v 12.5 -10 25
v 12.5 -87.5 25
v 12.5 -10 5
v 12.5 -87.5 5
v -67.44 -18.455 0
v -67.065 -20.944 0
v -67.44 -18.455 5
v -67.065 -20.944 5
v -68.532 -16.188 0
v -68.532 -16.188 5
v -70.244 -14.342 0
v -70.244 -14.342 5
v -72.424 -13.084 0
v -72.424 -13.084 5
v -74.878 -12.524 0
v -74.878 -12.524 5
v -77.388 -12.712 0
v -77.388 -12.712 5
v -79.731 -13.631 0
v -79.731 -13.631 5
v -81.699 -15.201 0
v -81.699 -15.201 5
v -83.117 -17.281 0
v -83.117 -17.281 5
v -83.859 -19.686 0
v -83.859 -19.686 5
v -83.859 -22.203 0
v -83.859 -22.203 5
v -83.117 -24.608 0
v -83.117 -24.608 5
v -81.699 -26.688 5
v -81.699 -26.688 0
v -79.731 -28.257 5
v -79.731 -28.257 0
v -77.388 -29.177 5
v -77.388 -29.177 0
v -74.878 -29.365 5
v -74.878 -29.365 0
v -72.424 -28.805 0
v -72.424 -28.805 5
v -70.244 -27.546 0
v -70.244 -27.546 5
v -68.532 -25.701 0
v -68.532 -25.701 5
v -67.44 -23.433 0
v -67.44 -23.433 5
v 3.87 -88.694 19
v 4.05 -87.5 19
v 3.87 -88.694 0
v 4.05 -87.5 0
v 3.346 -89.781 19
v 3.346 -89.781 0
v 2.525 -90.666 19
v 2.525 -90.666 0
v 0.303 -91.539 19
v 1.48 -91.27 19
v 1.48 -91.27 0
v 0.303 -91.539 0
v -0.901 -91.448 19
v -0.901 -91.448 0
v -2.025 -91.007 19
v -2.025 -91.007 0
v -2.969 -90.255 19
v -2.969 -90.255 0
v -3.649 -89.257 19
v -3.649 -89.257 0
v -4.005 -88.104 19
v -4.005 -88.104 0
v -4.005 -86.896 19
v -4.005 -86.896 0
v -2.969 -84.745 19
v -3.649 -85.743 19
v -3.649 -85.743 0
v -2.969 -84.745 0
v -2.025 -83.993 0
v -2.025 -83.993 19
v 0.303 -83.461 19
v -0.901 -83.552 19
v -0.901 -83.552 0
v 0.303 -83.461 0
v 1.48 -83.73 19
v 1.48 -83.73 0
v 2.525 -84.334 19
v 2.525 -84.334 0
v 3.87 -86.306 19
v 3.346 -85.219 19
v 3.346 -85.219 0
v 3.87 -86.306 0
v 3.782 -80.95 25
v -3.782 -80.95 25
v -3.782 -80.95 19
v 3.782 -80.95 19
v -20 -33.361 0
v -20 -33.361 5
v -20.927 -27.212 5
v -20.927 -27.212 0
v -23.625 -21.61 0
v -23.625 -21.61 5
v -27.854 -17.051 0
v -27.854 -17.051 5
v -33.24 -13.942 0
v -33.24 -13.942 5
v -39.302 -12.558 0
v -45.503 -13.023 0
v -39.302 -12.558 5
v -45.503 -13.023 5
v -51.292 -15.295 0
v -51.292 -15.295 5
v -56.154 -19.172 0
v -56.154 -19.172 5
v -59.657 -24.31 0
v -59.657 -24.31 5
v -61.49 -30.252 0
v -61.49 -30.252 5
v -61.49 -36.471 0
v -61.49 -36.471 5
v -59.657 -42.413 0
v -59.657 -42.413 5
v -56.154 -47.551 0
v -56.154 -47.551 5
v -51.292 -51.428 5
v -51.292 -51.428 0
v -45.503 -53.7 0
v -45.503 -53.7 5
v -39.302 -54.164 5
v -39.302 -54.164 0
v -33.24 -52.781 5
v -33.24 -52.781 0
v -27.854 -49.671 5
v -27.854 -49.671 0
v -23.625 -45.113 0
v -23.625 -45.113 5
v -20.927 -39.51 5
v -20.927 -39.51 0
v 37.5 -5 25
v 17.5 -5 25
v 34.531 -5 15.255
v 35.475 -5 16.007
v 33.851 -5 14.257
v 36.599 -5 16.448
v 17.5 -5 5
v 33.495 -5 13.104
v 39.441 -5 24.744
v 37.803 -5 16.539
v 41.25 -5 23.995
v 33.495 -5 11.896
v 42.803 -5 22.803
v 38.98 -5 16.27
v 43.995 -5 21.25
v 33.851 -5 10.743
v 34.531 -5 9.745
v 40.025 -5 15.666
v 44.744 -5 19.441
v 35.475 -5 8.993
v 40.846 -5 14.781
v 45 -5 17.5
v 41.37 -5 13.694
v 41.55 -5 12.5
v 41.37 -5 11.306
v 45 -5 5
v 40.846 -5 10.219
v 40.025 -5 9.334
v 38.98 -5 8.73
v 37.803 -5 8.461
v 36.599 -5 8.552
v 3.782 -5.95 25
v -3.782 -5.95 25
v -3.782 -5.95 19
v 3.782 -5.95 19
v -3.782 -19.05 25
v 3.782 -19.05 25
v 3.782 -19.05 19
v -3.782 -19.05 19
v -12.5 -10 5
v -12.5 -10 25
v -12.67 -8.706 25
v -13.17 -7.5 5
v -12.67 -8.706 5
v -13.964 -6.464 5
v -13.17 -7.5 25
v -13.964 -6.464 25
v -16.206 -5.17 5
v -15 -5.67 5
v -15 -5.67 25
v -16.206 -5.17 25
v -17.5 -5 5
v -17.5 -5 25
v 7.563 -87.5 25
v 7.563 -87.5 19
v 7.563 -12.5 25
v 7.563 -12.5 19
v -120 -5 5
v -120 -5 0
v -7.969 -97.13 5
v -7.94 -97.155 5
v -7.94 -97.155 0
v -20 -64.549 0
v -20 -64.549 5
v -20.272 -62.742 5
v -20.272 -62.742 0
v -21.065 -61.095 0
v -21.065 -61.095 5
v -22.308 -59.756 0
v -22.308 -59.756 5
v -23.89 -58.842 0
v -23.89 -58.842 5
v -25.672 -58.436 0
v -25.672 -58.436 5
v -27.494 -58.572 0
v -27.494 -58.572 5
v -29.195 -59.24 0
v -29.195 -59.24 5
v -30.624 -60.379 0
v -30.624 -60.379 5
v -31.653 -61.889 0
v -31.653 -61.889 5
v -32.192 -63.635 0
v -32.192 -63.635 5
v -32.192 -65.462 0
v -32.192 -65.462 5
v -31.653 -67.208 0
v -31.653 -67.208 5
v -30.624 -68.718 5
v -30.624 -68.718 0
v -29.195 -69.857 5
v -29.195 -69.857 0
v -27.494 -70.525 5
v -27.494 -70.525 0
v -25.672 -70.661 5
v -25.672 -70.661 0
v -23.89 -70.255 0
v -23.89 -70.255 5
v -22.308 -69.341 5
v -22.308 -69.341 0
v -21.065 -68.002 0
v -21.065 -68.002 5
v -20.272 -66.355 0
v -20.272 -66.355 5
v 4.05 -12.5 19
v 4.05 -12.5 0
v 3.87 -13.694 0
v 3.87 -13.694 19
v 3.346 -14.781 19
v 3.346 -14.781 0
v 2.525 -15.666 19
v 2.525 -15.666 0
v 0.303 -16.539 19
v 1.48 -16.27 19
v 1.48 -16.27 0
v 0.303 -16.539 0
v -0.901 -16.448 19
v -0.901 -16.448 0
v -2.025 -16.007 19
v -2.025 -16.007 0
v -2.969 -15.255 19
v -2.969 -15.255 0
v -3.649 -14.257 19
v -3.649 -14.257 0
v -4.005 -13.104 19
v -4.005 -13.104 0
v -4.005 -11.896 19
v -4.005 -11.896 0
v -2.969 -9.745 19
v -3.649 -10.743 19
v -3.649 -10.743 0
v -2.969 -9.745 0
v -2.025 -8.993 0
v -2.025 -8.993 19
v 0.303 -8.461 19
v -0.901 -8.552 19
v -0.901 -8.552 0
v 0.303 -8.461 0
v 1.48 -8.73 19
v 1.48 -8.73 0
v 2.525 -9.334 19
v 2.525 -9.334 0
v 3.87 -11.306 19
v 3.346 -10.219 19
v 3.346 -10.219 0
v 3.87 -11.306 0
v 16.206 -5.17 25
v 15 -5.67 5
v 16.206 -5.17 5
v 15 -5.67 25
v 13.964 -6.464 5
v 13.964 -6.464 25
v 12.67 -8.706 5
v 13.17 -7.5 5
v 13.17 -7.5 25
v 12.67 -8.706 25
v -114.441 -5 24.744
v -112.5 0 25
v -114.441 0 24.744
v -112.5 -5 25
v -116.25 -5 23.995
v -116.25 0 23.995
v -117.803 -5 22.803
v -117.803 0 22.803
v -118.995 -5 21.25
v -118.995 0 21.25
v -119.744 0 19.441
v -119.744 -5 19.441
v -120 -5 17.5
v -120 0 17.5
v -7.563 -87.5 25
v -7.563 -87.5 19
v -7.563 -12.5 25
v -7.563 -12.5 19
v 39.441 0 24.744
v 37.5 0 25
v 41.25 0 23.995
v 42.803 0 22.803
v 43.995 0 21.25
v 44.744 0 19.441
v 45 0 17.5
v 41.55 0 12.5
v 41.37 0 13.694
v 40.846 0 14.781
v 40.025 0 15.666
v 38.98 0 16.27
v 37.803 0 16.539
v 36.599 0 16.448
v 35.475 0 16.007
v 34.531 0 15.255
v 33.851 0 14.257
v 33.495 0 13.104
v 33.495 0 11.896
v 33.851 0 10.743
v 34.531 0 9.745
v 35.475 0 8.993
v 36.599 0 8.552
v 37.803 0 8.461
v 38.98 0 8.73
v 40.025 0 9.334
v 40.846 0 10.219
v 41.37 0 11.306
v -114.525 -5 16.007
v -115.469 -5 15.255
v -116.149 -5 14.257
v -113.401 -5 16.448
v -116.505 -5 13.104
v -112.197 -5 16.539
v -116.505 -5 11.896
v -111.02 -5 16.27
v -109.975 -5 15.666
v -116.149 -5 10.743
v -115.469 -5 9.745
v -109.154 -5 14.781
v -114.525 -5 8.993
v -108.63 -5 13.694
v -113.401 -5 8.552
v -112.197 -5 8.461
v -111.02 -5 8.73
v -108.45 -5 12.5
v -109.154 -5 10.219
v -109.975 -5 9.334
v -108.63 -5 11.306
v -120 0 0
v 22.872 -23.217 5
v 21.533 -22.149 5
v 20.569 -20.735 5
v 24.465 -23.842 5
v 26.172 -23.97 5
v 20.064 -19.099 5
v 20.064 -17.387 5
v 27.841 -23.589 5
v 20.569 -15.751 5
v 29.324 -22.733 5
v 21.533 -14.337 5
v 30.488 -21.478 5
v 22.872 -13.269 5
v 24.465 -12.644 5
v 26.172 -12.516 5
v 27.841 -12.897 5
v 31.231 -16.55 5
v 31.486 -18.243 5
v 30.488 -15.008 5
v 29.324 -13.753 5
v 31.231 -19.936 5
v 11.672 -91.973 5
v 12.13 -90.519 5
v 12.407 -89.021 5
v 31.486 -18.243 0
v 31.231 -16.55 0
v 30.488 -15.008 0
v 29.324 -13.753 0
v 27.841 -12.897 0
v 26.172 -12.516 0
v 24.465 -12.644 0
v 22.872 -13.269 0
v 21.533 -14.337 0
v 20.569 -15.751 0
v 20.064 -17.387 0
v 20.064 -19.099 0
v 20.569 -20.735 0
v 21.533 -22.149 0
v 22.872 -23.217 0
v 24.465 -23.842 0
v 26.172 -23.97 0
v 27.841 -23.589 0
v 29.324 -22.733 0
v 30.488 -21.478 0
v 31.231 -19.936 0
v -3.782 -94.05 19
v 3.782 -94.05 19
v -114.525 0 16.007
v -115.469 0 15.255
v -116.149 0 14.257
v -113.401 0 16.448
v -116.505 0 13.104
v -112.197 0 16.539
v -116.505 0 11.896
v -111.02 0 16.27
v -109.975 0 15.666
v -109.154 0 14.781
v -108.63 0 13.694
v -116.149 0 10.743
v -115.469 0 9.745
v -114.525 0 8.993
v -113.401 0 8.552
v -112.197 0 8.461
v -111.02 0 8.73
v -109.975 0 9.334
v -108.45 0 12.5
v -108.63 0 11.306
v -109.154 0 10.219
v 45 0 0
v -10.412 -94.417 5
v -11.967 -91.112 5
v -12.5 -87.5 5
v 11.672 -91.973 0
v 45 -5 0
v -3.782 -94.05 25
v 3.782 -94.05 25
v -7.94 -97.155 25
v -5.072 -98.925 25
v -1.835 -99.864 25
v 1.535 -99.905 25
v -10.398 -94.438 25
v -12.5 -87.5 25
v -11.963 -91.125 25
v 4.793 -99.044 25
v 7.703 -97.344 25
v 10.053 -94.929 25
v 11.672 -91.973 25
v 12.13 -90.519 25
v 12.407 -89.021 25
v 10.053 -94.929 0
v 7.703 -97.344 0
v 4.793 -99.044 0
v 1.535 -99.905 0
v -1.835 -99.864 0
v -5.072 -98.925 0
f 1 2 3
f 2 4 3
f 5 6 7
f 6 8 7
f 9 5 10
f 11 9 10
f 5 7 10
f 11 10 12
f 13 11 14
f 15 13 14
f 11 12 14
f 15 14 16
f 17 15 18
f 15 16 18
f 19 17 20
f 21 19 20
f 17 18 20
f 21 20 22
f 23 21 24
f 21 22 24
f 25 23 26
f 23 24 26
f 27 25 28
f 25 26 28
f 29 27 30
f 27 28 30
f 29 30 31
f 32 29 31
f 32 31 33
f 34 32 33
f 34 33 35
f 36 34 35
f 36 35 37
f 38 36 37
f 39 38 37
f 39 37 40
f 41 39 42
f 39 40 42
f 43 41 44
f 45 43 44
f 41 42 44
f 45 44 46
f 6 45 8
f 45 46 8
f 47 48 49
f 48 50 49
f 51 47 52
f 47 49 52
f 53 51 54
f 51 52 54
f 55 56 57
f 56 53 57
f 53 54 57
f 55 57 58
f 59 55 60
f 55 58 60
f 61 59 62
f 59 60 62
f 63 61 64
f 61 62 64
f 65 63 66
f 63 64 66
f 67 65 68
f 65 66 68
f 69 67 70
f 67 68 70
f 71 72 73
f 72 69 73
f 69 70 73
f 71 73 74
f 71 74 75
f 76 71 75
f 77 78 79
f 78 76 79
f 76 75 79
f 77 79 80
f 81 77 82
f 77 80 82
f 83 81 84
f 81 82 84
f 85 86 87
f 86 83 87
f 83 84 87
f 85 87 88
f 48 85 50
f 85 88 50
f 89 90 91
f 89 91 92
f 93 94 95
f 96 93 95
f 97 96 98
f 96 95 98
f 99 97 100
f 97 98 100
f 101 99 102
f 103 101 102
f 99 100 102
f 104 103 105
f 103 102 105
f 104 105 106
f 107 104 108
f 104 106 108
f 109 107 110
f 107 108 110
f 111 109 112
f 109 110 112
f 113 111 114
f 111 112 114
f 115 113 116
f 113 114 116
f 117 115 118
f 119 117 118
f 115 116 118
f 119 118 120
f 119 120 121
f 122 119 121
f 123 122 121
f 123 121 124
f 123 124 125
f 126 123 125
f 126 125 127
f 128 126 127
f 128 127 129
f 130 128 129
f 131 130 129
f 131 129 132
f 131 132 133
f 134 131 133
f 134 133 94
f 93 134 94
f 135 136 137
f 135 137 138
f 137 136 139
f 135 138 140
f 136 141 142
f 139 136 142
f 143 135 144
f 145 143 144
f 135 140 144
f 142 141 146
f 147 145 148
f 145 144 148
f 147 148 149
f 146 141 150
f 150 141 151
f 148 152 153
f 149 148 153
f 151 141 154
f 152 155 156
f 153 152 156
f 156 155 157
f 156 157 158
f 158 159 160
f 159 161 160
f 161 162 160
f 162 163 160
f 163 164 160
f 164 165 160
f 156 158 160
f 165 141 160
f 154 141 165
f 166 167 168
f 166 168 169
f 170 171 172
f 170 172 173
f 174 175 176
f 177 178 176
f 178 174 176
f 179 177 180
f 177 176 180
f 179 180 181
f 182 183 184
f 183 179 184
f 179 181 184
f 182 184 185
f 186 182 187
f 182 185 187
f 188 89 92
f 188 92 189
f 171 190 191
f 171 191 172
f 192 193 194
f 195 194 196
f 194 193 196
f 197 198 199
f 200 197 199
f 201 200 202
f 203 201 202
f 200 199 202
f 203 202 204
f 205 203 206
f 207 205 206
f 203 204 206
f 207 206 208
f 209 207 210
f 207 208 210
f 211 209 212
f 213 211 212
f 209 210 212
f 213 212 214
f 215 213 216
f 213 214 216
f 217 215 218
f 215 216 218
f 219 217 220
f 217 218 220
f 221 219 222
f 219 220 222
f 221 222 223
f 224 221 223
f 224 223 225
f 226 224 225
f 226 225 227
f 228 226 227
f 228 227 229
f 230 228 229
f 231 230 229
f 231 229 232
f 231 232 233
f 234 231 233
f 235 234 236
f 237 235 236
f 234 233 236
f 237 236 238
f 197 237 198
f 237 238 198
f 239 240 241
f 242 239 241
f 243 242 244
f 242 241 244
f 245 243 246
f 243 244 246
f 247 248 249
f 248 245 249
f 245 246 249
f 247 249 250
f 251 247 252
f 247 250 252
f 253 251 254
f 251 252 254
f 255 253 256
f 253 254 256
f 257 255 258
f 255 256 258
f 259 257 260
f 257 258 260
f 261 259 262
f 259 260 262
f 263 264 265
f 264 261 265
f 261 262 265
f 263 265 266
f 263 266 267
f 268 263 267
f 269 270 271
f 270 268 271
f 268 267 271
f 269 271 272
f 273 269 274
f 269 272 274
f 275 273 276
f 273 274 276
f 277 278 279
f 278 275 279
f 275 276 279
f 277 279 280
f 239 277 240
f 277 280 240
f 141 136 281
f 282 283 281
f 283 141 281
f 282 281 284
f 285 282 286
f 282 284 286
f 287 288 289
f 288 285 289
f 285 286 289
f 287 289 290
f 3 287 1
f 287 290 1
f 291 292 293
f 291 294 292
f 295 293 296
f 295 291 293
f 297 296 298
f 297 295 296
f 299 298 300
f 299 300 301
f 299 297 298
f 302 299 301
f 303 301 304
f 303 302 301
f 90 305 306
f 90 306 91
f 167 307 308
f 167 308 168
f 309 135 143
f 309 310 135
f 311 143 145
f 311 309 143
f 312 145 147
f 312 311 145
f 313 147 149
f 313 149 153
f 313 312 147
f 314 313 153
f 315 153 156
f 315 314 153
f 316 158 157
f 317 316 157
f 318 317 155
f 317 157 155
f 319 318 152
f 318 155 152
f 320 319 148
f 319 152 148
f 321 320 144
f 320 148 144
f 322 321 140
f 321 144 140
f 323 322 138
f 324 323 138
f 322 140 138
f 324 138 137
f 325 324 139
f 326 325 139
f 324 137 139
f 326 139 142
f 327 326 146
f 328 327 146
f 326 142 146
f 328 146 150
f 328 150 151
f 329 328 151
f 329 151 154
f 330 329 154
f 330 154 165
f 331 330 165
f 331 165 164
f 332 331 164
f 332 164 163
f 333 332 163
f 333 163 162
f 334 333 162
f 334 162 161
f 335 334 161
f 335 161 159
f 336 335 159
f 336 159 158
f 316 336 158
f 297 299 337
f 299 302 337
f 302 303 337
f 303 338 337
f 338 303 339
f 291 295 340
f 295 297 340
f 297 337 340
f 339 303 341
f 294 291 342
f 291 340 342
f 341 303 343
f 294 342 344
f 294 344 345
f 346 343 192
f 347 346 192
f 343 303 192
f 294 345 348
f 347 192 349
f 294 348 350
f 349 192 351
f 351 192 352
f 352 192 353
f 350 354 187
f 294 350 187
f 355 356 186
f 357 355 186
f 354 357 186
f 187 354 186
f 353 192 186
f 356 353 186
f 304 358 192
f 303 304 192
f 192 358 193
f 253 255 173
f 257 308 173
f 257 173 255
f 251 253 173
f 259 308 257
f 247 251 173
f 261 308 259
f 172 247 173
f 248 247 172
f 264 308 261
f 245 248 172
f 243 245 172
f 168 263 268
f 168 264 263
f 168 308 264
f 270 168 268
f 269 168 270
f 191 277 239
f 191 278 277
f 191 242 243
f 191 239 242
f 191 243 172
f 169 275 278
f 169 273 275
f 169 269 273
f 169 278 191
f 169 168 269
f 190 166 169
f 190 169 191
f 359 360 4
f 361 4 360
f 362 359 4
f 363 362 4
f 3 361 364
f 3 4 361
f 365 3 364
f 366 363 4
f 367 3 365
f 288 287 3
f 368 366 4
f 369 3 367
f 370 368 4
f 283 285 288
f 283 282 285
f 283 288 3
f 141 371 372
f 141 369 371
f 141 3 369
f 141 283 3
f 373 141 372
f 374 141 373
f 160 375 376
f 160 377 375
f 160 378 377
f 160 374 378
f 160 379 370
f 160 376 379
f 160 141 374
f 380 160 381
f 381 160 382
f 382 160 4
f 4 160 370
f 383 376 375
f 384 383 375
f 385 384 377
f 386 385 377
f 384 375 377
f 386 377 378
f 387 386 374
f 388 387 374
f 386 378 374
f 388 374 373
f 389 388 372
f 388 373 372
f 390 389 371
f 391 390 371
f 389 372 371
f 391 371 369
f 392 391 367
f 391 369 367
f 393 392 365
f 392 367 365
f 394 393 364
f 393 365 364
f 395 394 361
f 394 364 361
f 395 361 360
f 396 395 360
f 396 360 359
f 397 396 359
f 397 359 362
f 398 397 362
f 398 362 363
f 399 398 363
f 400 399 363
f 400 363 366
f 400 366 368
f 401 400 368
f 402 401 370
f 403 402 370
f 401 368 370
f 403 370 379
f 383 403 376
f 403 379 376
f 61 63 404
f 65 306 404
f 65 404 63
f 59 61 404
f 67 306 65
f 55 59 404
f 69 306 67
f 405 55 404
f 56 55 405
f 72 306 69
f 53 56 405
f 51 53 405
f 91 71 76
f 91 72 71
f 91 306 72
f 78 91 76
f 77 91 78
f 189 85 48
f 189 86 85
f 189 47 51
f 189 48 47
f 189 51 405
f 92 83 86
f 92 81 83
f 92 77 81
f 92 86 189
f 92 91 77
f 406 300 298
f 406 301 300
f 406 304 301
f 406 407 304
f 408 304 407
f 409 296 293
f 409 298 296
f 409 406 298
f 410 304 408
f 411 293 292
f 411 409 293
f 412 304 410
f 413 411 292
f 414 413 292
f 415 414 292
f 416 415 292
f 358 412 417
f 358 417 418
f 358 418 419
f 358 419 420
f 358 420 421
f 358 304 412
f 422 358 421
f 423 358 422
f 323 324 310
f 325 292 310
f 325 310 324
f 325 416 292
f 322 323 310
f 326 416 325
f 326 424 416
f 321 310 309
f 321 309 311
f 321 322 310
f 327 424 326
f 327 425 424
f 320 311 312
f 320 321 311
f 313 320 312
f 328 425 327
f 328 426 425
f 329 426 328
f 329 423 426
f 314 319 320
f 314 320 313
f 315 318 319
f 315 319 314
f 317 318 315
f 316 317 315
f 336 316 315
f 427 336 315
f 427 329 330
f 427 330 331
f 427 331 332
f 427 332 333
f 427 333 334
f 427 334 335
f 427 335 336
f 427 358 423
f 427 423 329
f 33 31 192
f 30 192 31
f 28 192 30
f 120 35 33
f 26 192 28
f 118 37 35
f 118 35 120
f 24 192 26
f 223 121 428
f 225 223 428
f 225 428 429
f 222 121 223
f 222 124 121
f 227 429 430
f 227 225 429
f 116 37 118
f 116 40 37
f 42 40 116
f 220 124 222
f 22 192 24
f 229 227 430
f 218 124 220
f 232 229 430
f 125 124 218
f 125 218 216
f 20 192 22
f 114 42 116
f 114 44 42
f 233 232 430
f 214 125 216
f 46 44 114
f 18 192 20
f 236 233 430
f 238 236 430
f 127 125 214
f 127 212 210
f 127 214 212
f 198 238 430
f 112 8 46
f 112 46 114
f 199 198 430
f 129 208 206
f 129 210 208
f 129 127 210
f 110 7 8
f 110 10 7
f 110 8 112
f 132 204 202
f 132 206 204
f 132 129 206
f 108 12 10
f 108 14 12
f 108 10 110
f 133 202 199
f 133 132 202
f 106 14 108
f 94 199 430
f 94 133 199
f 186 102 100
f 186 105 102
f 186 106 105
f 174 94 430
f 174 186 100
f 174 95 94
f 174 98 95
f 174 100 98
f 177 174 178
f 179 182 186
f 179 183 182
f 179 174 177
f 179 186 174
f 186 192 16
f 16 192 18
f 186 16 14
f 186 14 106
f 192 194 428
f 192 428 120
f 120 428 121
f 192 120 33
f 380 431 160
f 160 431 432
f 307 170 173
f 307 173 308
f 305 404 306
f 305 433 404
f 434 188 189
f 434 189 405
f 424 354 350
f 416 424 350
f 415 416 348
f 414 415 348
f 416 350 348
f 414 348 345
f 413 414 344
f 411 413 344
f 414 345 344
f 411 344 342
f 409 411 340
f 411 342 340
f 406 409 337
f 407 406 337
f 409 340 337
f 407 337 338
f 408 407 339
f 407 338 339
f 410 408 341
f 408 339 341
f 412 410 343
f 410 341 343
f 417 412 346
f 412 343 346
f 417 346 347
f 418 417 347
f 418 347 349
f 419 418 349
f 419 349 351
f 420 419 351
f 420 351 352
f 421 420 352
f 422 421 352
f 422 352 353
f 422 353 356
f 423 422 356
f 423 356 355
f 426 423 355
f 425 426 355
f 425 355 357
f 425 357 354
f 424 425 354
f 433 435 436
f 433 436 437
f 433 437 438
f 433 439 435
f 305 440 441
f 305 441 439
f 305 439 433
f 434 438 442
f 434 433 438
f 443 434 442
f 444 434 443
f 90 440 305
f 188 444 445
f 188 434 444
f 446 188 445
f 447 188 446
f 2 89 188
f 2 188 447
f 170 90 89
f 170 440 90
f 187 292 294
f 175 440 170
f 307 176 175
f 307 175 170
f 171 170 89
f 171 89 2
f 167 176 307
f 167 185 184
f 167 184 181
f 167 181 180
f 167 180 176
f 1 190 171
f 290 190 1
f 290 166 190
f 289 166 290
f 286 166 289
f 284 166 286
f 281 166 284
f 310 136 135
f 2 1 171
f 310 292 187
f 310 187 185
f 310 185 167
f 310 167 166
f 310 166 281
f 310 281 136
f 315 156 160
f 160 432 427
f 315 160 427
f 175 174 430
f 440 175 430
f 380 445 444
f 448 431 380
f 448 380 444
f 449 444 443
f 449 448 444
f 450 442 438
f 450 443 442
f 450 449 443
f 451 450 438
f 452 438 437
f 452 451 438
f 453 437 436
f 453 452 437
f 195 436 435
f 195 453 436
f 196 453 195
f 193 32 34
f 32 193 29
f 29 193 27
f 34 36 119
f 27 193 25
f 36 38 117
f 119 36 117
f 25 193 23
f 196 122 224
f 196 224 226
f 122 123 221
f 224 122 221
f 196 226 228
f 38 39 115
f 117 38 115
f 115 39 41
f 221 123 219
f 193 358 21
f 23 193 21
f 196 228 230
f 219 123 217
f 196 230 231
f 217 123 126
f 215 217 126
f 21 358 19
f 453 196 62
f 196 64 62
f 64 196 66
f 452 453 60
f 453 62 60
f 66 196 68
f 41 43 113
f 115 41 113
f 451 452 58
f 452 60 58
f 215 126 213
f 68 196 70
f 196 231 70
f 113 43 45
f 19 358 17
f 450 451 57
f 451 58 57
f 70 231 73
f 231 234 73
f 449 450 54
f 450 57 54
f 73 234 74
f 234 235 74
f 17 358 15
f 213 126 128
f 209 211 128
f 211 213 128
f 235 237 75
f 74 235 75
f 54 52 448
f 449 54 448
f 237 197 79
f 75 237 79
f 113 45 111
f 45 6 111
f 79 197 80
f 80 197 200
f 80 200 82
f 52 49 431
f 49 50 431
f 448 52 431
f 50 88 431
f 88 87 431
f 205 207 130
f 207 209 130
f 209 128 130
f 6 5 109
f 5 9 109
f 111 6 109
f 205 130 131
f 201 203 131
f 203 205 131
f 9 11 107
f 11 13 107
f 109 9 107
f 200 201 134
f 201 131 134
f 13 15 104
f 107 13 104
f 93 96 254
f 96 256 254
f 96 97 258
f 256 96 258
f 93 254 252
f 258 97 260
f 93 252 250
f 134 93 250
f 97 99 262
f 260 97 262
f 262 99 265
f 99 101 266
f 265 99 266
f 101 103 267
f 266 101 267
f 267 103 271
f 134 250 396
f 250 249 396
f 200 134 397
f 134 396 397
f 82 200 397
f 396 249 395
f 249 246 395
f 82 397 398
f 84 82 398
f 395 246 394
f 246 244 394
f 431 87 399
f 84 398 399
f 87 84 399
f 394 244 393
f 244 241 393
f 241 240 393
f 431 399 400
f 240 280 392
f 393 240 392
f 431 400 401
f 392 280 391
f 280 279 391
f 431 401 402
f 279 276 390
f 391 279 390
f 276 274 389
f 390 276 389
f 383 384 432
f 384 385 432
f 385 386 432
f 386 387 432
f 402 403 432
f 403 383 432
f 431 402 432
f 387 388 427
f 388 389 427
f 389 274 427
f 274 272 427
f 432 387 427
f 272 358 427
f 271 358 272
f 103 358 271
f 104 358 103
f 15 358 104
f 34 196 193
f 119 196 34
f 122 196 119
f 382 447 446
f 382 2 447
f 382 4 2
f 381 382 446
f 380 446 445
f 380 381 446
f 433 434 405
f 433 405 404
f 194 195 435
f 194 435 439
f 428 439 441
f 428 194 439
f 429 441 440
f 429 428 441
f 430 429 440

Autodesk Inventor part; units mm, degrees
ref_plane "YZ Plane" through (0, 0, 0) normal (1, 0, 0) x (0, 1, 0)
ref_plane "XZ Plane" through (0, 0, 0) normal (0, 1, 0) x (-1, 0, 0)
ref_plane "XY Plane" through (0, 0, 0) normal (0, 0, 1) x (1, 0, 0)
sketch "Sketch1" plane through (0, 0, 0) normal (0, 0, 1) x (1, 0, 0)
  line L0 (-120, 0) -> (45, 0)
  circle A0 centre (0, -12.5) radius 4.05
  circle A1 centre (0, -87.5) radius 4.05
  line L1 (-120, 0) -> (-120, -5)
  line L2 (-120, -5) -> (-7.9396, -97.1546)
  arc A2 (-7.9396, -97.1546) -> (11.6724, -91.9728) centre (0, -87.5) ccw
  line L3 (11.6724, -91.9728) -> (45, -5)
  line L4 (45, -5) -> (45, 0)
  point P0 (0, 0)
  dimension "d0" = 12.5
  dimension "d1" = 75
  dimension "d2" = 8.1
  dimension "d3" = 165
  dimension "d4" = 12.5
  dimension "d5" = 5
  dimension "d6" = 45
extrude "Extrusion1" add sketch "Sketch1" along normal blind 5
sketch "Sketch2" plane through (0, 0, 5) normal (0, 0, 1) x (1, 0, 0)
  circle A0 centre (0, -87.5) radius 4.05 projected
  circle A1 centre (0, -12.5) radius 4.05 projected
  line L0 (45, 0) -> (-120, 0) projected
  line L1 (-120, 0) -> (-120, -5) projected
  arc A2 (-7.9396, -97.1546) -> (11.6724, -91.9728) centre (0, -87.5) ccw projected
  line L2 (45, -5) -> (45, 0) projected
  circle A3 centre (0, -87.5) radius 12.5
  line L3 (-120, -5) -> (-12.5, -5)
  line L4 (-12.5, -5) -> (-12.5, -87.5)
  line L5 (12.5, -87.5) -> (12.5, -5)
  line L6 (12.5, -5) -> (45, -5)
  point P0 (0, 0)
extrude "Extrusion2" add sketch "Sketch2" along normal blind 20
sketch "Sketch3" plane through (-120, -5, 5) normal (0, -1, 0) x (1, 0, 0)
  line L0 (107.5, 0) -> (0, 0) projected
  line L1 (0, 20) -> (107.5, 20) projected
  line L2 (0, 0) -> (0, 20) projected
  line L3 (165, 0) -> (132.5, 0) projected
  line L4 (165, 0) -> (165, 20) projected
  line L5 (132.5, 20) -> (165, 20) projected
  line L6 (132.5, 0) -> (132.5, 20) projected
  line L7 (7.5, 7.5) -> (157.5, 7.5)
  circle A0 centre (157.5, 7.5) radius 4.05
  circle A1 centre (7.5, 7.5) radius 4.05
  point P0 (120, -5)
  dimension "d11" = 8.1
  dimension "d13" = 150
  dimension "d14" = 7.5
  dimension "d15" = 12.5
extrude "Extrusion3" cut sketch "Sketch3" against normal through all contours A1 | A0
fillet "Fillet1" radius 5 2 edges at (12.5, -5, 15) (-12.5, -5, 15)
sketch "Sketch4" plane through (0, 0, 25) normal (0, 0, 1) x (1, 0, 0)
  circle A0 centre (0, -12.5) radius 4.05 projected
  circle A1 centre (0, -87.5) radius 4.05 projected
  arc A2 (-12.5, -87.5) -> (12.5, -87.5) centre (0, -87.5) ccw projected
  line L0 (7.5633, -12.5) -> (3.7816, -19.05)
  line L1 (3.7816, -19.05) -> (-3.7816, -19.05)
  line L2 (-3.7816, -19.05) -> (-7.5633, -12.5)
  line L3 (-7.5633, -12.5) -> (-3.7816, -5.95)
  line L4 (-3.7816, -5.95) -> (3.7816, -5.95)
  line L5 (3.7816, -5.95) -> (7.5633, -12.5)
  line L6 (7.5633, -87.5) -> (3.7816, -94.05)
  line L7 (3.7816, -94.05) -> (-3.7816, -94.05)
  line L8 (-3.7816, -94.05) -> (-7.5633, -87.5)
  line L9 (-7.5633, -87.5) -> (-3.7816, -80.95)
  line L10 (-3.7816, -80.95) -> (3.7816, -80.95)
  line L11 (3.7816, -80.95) -> (7.5633, -87.5)
  point P0 (0, 0)
  dimension "d19" = 13.1
extrude "Extrusion4" cut sketch "Sketch4" against normal blind 6
sketch "Sketch7" plane through (0, 0, 5) normal (0, 0, 1) x (1, 0, 0)
  line L0 (-120, -5) -> (-7.9396, -97.1546) projected
  circle A0 centre (-40.8613, -33.3613) radius 28.3613
  line L1 (-120, -5) -> (-17.5, -5) projected
  line L2 (-12.5, -10) -> (-12.5, -87.5) projected
  circle A1 centre (-40.8613, -33.3613) radius 20.8613
  point P0 (0, 0)
  dimension "d31" = 7.5
extrude "Extrusion7" cut sketch "Sketch7" against normal through all contours A1
sketch "Sketch8" plane through (0, 0, 5) normal (0, 0, 1) x (1, 0, 0)
  circle A0 centre (-40.8613, -33.3613) radius 20.8613 projected
  line L0 (-120, -5) -> (-7.9396, -97.1546) projected
  circle A1 centre (-75.5091, -20.9444) radius 15.9444
  circle A2 centre (-75.5091, -20.9444) radius 8.4444
  line L1 (-120, -5) -> (-17.5, -5) projected
  point P0 (0, 0)
  dimension "d37" = 7.5
extrude "Extrusion8" cut sketch "Sketch8" against normal through all contours A2
sketch "Sketch9" plane through (0, 0, 5) normal (0, 0, 1) x (1, 0, 0)
  circle A0 centre (-40.8613, -33.3613) radius 20.8613 projected
  line L0 (-120, -5) -> (-7.9396, -97.1546) projected
  circle A1 centre (-26.13, -64.5485) radius 13.63
  line L1 (-12.5, -10) -> (-12.5, -87.5) projected
  circle A2 centre (-26.13, -64.5485) radius 6.13
  point P0 (0, 0)
  dimension "d41" = 7.5
extrude "Extrusion9" cut sketch "Sketch9" against normal through all contours A2
sketch "Sketch10" plane through (0, 0, 5) normal (0, 0, 1) x (1, 0, 0)
  line L0 (11.6724, -91.9728) -> (45, -5) projected
  circle A0 centre (25.7431, -18.2431) radius 13.2431
  line L1 (17.5, -5) -> (45, -5) projected
  line L2 (12.5, -87.5) -> (12.5, -10) projected
  circle A1 centre (25.7431, -18.2431) radius 5.7431
  point P0 (0, 0)
  dimension "d45" = 7.5
extrude "Extrusion10" cut sketch "Sketch10" against normal through all contours A1
fillet "Fillet2" radius 7.5 2 edges at (-120, -2.5, 25) (45, -2.5, 25)
properties part number "board bracket right"
